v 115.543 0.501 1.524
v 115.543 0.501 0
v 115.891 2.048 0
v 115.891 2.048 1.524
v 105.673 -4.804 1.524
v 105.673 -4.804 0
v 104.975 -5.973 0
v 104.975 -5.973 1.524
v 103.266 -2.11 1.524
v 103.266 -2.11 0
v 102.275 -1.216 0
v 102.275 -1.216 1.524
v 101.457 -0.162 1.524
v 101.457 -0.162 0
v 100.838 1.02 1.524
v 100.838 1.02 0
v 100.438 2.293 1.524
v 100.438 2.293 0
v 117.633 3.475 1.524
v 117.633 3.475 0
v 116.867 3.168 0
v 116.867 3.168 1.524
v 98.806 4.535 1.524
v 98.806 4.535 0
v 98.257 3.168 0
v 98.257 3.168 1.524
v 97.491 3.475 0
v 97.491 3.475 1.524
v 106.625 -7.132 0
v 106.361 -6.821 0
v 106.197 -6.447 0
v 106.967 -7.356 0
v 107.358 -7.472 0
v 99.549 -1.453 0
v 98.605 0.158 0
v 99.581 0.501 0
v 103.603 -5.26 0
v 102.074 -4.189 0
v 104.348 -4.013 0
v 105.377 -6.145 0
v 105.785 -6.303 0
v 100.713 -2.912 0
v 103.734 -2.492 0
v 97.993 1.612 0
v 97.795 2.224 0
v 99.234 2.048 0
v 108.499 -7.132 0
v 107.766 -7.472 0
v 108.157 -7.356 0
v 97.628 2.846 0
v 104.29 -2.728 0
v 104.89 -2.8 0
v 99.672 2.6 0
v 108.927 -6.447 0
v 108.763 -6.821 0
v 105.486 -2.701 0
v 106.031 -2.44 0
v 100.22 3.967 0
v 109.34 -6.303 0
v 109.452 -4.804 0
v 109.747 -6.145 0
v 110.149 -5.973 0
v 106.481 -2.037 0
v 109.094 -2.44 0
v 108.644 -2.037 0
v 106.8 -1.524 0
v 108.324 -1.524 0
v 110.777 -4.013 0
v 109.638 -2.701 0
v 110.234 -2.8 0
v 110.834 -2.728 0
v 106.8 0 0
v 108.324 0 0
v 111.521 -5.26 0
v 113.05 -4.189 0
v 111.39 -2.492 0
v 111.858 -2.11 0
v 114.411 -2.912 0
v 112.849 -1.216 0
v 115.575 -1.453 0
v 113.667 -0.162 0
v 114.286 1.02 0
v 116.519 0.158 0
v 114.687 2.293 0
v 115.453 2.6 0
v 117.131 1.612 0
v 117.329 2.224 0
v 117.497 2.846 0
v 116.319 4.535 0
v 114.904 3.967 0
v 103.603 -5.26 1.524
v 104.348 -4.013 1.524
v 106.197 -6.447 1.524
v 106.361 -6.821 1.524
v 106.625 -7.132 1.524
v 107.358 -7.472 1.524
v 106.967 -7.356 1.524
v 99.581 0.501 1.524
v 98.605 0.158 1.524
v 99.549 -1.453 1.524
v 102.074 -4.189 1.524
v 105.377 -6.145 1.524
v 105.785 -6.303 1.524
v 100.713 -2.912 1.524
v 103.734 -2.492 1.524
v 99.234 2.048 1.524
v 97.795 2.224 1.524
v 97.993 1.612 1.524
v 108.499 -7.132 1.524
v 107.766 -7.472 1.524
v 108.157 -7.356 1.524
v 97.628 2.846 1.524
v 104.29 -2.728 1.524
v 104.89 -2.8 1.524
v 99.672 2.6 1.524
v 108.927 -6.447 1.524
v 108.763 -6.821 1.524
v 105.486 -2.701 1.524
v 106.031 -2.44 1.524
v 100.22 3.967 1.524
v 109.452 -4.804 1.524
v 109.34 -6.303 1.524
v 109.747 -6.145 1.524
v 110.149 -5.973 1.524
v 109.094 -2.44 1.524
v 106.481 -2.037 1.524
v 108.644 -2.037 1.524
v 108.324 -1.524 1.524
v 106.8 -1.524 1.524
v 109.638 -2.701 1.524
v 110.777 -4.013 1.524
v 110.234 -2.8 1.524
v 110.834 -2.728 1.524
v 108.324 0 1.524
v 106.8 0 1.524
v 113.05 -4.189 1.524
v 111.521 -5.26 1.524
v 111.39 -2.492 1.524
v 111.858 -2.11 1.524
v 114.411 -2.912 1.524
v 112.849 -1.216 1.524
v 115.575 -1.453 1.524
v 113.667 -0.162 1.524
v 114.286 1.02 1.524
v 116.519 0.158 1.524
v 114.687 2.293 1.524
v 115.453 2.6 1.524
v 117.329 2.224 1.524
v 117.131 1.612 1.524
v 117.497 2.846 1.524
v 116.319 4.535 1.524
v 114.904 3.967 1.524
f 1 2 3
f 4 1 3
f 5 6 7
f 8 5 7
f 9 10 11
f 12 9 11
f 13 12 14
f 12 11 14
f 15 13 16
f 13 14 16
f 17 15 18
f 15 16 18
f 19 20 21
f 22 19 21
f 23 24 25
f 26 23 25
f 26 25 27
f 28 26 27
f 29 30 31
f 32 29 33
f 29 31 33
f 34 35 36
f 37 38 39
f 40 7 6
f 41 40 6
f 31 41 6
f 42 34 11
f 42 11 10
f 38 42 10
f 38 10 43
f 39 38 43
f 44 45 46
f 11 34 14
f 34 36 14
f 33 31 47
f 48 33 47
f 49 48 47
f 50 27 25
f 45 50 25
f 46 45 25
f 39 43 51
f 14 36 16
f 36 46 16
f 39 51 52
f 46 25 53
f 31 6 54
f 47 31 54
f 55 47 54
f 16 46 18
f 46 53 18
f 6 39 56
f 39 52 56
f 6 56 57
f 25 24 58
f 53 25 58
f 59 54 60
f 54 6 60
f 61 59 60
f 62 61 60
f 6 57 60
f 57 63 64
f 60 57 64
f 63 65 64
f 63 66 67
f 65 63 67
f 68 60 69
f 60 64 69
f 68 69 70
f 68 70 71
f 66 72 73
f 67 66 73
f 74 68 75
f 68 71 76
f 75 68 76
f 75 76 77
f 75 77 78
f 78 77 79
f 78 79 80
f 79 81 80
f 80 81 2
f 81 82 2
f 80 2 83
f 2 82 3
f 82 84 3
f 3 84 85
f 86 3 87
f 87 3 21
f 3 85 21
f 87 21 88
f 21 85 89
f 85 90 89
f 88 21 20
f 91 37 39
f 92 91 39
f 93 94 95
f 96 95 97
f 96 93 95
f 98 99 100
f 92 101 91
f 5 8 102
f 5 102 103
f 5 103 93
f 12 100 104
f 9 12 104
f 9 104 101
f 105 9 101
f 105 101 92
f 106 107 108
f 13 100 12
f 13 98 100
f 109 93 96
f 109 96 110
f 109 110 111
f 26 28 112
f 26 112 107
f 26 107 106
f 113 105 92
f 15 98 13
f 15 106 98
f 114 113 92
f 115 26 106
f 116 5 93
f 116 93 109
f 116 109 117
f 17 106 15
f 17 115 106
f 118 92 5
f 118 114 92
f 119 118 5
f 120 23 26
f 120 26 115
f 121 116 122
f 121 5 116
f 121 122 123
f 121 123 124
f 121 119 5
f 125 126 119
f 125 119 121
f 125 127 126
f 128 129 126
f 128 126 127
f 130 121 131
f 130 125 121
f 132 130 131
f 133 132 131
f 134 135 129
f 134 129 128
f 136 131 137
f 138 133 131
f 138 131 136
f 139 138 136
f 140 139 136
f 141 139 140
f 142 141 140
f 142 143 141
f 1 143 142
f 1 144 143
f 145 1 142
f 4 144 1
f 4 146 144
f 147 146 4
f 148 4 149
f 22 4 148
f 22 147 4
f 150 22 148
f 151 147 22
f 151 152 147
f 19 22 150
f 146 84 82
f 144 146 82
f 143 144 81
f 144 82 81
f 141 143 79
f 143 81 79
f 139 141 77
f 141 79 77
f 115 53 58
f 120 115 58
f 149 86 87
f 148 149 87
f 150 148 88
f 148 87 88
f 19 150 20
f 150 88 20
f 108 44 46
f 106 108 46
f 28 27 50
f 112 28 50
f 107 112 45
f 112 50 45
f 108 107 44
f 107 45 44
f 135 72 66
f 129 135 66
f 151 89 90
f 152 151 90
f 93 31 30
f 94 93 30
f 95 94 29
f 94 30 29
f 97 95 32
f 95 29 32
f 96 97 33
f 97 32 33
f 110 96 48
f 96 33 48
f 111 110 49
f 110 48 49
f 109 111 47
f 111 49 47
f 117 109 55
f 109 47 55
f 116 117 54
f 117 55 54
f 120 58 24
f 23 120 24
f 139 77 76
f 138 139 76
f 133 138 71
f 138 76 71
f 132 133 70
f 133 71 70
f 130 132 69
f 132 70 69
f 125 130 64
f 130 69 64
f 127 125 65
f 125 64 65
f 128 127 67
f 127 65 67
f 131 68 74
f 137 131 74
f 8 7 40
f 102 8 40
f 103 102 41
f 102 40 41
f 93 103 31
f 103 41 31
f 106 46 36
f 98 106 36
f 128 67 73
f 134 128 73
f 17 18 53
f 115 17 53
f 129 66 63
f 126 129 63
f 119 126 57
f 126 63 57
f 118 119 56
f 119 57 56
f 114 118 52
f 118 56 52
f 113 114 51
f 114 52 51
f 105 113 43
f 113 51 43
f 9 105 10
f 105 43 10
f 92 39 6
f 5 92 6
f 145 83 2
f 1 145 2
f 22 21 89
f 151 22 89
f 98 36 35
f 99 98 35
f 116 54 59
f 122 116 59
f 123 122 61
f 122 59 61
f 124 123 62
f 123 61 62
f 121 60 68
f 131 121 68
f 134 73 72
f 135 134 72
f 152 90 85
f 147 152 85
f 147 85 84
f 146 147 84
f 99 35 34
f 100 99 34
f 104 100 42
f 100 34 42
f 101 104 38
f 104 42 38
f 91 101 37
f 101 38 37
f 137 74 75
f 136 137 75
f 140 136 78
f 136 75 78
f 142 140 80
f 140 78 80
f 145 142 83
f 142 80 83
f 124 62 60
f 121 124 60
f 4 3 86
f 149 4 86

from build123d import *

# Parameters (mm, degrees)
BOSS_EXTRUDE1_DEPTH = 1.524


with BuildPart() as part:
    # Sketch1 → Boss-Extrude1 (new body)
    with BuildSketch(Plane.XY):
        with BuildLine():
            Line((106.800157748, 0), (106.800157748, -1.524))
            ThreePointArc((106.800157748, -1.524), (105.191459449, -2.771684776), (103.266120199, -2.110098583))
            ThreePointArc((103.266120199, -2.110098583), (101.457479492, -0.162046547), (100.437603623, 2.292732701))
            Line((100.437603623, 2.292732701), (99.671504405, 2.600209915))
            Line((99.671504405, 2.600209915), (100.220071172, 3.966999231))
            Line((100.220071172, 3.966999231), (98.805734154, 4.534649474))
            Line((98.805734154, 4.534649474), (98.257167386, 3.167860158))
            Line((98.257167386, 3.167860158), (97.491068168, 3.475337373))
            ThreePointArc((97.491068168, 3.475337373), (97.707736418, 2.534285361), (97.993480897, 1.611856983))
            Line((97.993480897, 1.611856983), (99.233794217, 2.047797072))
            Line((99.233794217, 2.047797072), (99.580941947, 0.500608663))
            Line((99.580941947, 0.500608663), (98.60492848, 0.15756357))
            ThreePointArc((98.60492848, 0.15756357), (100.713257844, -2.911730159), (103.603390941, -5.259654218))
            Line((103.603390941, -5.259654218), (104.347526725, -4.013018416))
            Line((104.347526725, -4.013018416), (105.672752741, -4.804065888))
            Line((105.672752741, -4.804065888), (104.974997158, -5.973001868))
            ThreePointArc((104.974997158, -5.973001868), (105.580159309, -6.225365098), (106.197246416, -6.446977219))
            ThreePointArc((106.197246416, -6.446977219), (107.562157749, -7.48677465), (108.927069081, -6.446977219))
            ThreePointArc((108.927069081, -6.446977219), (109.544156188, -6.225365098), (110.14931834, -5.973001868))
            Line((110.14931834, -5.973001868), (109.451562757, -4.804065888))
            Line((109.451562757, -4.804065888), (110.776788773, -4.013018416))
            Line((110.776788773, -4.013018416), (111.520924556, -5.259654218))
            ThreePointArc((111.520924556, -5.259654218), (114.411057653, -2.911730159), (116.519387018, 0.15756357))
            Line((116.519387018, 0.15756357), (115.543373551, 0.500608663))
            Line((115.543373551, 0.500608663), (115.89052128, 2.047797072))
            Line((115.89052128, 2.047797072), (117.130834601, 1.611856983))
            ThreePointArc((117.130834601, 1.611856983), (117.41657908, 2.534285361), (117.63324733, 3.475337373))
            Line((117.63324733, 3.475337373), (116.867148112, 3.167860158))
            Line((116.867148112, 3.167860158), (116.318581344, 4.534649474))
            Line((116.318581344, 4.534649474), (114.904244325, 3.966999231))
            Line((114.904244325, 3.966999231), (115.452811093, 2.600209915))
            Line((115.452811093, 2.600209915), (114.686711874, 2.292732701))
            ThreePointArc((114.686711874, 2.292732701), (113.666836006, -0.162046547), (111.858195299, -2.110098583))
            ThreePointArc((111.858195299, -2.110098583), (109.932856049, -2.771684776), (108.32415775, -1.524))
            Line((108.32415775, -1.524), (108.32415775, 0))
            Line((108.32415775, 0), (106.800157748, 0))
        make_face()
    extrude(amount=BOSS_EXTRUDE1_DEPTH)


solid = part.part
